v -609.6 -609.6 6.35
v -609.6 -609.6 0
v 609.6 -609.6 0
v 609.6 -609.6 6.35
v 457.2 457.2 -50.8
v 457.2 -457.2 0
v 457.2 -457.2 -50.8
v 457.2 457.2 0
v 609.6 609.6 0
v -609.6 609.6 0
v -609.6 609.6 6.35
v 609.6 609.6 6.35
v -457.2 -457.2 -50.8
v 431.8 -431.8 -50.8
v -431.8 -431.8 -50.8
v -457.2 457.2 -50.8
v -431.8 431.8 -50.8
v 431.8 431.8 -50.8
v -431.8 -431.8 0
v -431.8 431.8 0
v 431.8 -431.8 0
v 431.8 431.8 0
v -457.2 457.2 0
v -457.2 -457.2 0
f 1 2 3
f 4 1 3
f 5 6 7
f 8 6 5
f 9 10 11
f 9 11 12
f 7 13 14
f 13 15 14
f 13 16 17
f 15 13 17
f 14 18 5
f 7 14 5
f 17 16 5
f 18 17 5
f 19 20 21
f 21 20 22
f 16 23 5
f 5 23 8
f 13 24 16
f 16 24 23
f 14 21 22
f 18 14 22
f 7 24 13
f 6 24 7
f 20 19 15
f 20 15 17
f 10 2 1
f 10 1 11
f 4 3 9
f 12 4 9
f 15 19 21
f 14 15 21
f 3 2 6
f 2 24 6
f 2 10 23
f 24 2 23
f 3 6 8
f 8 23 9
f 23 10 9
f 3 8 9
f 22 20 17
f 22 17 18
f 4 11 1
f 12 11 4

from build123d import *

# Parameters (mm, degrees)
F0_W     = 1219.2
F0_H     = 1219.2
F0_W_2   = 914.4
F0_H_2   = 914.4
F1_DEPTH = 6.35
F2_W     = 914.4
F2_H     = 914.4
F2_W_2   = 863.6
F2_H_2   = 863.6
F3_DEPTH = 57.15


with BuildPart() as f1:
    # F0 (on Top) → F1 (new body)
    with BuildSketch(Plane.XY):
        Rectangle(F0_W, F0_H)
        Rectangle(F0_W_2, F0_H_2, mode=Mode.SUBTRACT)
        Rectangle(F0_W_2, F0_H_2)
    extrude(amount=F1_DEPTH)

    # F2 (on face) → F3 (join)
    with BuildSketch(Plane.XY.offset(6.35)):
        Rectangle(F2_W, F2_H)
        Rectangle(F2_W_2, F2_H_2, mode=Mode.SUBTRACT)
    extrude(amount=-F3_DEPTH)


solid = f1.part
